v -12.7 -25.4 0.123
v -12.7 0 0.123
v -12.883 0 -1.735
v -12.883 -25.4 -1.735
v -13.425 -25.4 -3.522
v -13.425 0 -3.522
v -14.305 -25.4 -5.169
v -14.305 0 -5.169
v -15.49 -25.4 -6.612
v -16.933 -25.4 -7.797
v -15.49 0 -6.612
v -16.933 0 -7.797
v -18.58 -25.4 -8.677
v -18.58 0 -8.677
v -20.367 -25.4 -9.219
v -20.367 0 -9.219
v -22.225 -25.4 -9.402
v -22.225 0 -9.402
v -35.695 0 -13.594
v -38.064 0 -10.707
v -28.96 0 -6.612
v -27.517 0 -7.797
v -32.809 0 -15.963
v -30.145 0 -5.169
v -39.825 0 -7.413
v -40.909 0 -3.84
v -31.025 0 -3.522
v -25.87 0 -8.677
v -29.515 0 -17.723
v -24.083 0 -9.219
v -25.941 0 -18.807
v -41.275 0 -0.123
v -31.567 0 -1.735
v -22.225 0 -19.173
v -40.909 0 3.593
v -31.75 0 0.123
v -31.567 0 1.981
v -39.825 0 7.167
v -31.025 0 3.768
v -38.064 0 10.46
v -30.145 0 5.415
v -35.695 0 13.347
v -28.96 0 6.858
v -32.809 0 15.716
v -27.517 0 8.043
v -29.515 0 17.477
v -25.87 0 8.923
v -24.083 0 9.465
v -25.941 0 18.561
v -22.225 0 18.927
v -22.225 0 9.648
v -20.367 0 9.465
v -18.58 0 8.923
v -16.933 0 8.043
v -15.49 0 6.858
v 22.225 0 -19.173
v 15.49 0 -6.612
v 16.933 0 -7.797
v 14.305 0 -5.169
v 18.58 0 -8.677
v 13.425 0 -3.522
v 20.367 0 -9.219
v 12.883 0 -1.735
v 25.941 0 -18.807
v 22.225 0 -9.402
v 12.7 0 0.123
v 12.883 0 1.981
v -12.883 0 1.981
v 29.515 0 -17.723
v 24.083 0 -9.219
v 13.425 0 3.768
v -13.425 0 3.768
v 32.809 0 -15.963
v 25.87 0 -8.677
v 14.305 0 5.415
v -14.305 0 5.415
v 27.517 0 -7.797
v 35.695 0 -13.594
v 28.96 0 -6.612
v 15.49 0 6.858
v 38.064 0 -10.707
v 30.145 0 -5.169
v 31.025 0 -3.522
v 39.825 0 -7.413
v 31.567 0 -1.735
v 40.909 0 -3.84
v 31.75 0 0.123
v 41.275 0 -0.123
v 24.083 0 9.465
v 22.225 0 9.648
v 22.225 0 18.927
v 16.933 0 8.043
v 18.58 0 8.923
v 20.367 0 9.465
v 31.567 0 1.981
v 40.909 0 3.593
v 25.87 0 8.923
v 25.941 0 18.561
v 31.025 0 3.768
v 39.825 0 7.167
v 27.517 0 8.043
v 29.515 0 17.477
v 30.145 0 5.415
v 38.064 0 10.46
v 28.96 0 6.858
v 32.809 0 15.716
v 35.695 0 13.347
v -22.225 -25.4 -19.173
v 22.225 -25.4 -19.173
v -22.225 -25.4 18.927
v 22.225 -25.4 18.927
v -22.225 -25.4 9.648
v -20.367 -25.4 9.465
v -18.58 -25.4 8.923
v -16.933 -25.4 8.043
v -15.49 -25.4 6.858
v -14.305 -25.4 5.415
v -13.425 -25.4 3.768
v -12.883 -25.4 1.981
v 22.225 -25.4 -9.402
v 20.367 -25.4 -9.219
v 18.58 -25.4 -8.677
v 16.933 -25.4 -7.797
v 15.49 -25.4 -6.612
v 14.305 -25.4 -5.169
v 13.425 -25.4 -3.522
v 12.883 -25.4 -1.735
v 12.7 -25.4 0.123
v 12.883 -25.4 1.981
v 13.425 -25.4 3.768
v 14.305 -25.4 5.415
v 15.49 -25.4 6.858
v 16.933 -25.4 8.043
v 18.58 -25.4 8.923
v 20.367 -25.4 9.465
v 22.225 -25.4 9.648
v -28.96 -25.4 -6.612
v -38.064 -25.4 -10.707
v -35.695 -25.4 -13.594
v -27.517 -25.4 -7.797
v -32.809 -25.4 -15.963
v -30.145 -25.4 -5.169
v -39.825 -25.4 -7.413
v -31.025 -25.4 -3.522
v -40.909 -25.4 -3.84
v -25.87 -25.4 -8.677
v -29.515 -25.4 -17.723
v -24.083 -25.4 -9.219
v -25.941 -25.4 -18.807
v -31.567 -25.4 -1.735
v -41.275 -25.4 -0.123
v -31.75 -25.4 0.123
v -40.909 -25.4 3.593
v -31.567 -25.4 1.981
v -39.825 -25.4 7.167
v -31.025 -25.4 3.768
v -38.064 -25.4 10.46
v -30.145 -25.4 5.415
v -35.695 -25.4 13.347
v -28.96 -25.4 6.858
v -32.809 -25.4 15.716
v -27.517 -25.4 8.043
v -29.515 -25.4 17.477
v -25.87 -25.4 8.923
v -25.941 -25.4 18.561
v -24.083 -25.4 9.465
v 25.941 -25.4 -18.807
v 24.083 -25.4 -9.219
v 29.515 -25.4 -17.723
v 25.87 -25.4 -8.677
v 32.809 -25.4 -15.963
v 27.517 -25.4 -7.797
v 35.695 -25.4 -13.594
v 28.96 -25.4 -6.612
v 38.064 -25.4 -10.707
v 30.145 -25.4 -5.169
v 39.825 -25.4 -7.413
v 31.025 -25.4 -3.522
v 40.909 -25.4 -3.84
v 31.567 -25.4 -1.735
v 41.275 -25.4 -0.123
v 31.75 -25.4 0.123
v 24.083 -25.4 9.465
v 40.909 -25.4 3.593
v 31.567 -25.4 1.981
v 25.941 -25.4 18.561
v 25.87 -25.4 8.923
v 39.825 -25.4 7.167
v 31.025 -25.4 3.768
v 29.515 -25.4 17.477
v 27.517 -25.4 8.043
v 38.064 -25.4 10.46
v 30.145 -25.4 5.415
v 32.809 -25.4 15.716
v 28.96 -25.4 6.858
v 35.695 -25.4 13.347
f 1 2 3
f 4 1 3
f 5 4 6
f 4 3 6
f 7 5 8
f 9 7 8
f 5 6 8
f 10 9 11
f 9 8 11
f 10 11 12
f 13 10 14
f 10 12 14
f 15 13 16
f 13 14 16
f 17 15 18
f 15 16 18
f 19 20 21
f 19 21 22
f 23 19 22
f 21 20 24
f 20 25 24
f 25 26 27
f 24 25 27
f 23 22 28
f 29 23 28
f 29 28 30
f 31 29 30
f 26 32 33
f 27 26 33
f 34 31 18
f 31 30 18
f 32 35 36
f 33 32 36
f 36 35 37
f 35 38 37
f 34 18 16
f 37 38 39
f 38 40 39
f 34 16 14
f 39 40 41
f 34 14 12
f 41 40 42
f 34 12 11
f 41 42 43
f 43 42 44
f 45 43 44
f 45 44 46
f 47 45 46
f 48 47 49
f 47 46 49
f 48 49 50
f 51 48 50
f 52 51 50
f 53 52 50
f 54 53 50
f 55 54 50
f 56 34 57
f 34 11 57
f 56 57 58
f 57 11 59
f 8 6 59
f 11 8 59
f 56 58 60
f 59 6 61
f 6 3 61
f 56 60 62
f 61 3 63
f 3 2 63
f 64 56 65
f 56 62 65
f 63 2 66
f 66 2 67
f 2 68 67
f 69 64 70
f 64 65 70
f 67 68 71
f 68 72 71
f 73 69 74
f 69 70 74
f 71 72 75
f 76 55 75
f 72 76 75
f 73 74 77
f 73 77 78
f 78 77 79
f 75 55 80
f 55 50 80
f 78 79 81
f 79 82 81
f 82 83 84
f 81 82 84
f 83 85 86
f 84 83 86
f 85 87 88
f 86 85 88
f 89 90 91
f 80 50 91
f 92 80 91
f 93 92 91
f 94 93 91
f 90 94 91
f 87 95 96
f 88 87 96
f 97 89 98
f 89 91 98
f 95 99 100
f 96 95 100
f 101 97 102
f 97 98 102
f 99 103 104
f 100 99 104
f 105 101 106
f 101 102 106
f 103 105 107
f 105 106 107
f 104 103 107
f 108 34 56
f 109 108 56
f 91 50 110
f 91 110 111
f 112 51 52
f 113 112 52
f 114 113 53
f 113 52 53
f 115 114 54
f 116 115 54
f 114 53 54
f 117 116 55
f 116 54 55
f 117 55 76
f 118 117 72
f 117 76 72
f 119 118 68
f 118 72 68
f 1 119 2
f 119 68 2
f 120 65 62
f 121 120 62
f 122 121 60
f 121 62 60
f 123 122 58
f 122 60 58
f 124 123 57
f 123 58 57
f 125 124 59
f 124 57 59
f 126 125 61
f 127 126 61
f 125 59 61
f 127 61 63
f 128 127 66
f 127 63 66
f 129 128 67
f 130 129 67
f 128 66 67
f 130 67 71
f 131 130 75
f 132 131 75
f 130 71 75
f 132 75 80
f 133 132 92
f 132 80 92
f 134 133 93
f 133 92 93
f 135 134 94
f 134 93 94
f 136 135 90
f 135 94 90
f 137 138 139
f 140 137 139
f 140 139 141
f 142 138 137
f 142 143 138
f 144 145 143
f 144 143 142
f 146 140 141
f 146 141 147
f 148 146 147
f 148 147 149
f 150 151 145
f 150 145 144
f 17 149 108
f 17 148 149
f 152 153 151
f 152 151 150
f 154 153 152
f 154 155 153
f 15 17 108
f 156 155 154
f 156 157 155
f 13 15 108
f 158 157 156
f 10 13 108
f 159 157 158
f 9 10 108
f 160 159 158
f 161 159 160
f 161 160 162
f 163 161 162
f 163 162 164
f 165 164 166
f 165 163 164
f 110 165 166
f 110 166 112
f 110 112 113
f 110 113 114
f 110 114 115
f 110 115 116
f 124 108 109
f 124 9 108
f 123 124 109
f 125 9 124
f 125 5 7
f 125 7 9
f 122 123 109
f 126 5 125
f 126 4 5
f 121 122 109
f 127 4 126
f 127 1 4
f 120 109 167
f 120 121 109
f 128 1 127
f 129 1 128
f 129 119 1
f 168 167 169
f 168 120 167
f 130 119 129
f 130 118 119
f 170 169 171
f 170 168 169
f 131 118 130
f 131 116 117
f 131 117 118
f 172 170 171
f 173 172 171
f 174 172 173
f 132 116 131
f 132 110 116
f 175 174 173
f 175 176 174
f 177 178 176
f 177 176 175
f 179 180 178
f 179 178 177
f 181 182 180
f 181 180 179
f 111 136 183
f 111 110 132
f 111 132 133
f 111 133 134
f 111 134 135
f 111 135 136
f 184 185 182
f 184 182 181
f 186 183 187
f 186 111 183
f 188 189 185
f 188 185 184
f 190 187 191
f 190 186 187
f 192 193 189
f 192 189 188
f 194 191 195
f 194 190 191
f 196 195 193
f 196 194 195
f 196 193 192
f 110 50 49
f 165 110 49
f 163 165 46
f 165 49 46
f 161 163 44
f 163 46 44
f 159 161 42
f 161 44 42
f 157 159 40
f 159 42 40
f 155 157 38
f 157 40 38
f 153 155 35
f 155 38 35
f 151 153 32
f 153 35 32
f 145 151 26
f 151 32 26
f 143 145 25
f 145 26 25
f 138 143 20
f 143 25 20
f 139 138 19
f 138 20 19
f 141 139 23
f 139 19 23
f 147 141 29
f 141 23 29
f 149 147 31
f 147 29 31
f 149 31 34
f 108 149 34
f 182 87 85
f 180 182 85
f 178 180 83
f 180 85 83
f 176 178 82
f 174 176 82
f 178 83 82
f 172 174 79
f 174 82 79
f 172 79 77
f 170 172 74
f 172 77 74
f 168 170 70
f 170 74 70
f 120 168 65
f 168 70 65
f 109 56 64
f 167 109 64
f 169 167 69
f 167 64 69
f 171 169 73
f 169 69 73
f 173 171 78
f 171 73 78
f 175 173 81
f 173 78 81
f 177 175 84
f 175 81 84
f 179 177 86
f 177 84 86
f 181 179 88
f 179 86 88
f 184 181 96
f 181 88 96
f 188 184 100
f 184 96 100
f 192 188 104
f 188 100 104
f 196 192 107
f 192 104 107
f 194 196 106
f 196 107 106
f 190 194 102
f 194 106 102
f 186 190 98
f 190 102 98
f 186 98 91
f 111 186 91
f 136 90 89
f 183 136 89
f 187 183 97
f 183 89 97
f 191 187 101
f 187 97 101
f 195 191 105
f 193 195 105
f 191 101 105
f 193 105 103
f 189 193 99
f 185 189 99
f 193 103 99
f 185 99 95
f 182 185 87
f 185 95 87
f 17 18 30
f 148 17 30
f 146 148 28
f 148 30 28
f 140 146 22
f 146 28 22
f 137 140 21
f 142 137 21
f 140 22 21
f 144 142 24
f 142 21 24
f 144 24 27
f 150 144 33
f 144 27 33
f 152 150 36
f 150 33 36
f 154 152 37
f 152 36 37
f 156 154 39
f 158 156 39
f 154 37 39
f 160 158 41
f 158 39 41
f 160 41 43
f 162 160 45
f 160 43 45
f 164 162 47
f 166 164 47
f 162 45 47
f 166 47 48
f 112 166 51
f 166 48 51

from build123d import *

# Parameters (mm, degrees)
F0_W     = 44.45
F0_H     = 9.278706
F0_H_2   = 9.771294
F1_DEPTH = 25.4


with BuildPart() as f1:
    # F0 (on Front) → F1 (new body)
    with BuildSketch(Plane.XZ):
        with BuildLine():
            ThreePointArc((22.225, -19.173147), (41.275, -0.123147), (22.225, 18.926853))
            Line((22.225, 18.926853), (22.225, 9.648147))
            ThreePointArc((22.225, 9.648147), (28.960192, 6.858339), (31.75, 0.123147))
            ThreePointArc((31.75, 0.123147), (28.960192, -6.612045), (22.225, -9.401853))
            Line((22.225, -9.401853), (22.225, -19.173147))
        make_face()
        with Locations((0, 14.2875)):
            Rectangle(F0_W, F0_H)
        with Locations((0, -14.2875)):
            Rectangle(F0_W, F0_H_2)
        with BuildLine():
            Line((-22.225, 9.648147), (-22.225, 18.926853))
            ThreePointArc((-22.225, 18.926853), (-41.275, -0.123147), (-22.225, -19.173147))
            Line((-22.225, -19.173147), (-22.225, -9.401853))
            ThreePointArc((-22.225, -9.401853), (-31.75, 0.123147), (-22.225, 9.648147))
        make_face()
        with BuildLine():
            Line((22.225, 9.648147), (-22.225, 9.648147))
            ThreePointArc((-22.225, 9.648147), (-15.489808, 6.858339), (-12.7, 0.123147))
            ThreePointArc((-12.7, 0.123147), (-15.489808, -6.612045), (-22.225, -9.401853))
            Line((-22.225, -9.401853), (22.225, -9.401853))
            ThreePointArc((22.225, -9.401853), (12.7, 0.123147), (22.225, 9.648147))
        make_face()
    extrude(amount=F1_DEPTH)


solid = f1.part
